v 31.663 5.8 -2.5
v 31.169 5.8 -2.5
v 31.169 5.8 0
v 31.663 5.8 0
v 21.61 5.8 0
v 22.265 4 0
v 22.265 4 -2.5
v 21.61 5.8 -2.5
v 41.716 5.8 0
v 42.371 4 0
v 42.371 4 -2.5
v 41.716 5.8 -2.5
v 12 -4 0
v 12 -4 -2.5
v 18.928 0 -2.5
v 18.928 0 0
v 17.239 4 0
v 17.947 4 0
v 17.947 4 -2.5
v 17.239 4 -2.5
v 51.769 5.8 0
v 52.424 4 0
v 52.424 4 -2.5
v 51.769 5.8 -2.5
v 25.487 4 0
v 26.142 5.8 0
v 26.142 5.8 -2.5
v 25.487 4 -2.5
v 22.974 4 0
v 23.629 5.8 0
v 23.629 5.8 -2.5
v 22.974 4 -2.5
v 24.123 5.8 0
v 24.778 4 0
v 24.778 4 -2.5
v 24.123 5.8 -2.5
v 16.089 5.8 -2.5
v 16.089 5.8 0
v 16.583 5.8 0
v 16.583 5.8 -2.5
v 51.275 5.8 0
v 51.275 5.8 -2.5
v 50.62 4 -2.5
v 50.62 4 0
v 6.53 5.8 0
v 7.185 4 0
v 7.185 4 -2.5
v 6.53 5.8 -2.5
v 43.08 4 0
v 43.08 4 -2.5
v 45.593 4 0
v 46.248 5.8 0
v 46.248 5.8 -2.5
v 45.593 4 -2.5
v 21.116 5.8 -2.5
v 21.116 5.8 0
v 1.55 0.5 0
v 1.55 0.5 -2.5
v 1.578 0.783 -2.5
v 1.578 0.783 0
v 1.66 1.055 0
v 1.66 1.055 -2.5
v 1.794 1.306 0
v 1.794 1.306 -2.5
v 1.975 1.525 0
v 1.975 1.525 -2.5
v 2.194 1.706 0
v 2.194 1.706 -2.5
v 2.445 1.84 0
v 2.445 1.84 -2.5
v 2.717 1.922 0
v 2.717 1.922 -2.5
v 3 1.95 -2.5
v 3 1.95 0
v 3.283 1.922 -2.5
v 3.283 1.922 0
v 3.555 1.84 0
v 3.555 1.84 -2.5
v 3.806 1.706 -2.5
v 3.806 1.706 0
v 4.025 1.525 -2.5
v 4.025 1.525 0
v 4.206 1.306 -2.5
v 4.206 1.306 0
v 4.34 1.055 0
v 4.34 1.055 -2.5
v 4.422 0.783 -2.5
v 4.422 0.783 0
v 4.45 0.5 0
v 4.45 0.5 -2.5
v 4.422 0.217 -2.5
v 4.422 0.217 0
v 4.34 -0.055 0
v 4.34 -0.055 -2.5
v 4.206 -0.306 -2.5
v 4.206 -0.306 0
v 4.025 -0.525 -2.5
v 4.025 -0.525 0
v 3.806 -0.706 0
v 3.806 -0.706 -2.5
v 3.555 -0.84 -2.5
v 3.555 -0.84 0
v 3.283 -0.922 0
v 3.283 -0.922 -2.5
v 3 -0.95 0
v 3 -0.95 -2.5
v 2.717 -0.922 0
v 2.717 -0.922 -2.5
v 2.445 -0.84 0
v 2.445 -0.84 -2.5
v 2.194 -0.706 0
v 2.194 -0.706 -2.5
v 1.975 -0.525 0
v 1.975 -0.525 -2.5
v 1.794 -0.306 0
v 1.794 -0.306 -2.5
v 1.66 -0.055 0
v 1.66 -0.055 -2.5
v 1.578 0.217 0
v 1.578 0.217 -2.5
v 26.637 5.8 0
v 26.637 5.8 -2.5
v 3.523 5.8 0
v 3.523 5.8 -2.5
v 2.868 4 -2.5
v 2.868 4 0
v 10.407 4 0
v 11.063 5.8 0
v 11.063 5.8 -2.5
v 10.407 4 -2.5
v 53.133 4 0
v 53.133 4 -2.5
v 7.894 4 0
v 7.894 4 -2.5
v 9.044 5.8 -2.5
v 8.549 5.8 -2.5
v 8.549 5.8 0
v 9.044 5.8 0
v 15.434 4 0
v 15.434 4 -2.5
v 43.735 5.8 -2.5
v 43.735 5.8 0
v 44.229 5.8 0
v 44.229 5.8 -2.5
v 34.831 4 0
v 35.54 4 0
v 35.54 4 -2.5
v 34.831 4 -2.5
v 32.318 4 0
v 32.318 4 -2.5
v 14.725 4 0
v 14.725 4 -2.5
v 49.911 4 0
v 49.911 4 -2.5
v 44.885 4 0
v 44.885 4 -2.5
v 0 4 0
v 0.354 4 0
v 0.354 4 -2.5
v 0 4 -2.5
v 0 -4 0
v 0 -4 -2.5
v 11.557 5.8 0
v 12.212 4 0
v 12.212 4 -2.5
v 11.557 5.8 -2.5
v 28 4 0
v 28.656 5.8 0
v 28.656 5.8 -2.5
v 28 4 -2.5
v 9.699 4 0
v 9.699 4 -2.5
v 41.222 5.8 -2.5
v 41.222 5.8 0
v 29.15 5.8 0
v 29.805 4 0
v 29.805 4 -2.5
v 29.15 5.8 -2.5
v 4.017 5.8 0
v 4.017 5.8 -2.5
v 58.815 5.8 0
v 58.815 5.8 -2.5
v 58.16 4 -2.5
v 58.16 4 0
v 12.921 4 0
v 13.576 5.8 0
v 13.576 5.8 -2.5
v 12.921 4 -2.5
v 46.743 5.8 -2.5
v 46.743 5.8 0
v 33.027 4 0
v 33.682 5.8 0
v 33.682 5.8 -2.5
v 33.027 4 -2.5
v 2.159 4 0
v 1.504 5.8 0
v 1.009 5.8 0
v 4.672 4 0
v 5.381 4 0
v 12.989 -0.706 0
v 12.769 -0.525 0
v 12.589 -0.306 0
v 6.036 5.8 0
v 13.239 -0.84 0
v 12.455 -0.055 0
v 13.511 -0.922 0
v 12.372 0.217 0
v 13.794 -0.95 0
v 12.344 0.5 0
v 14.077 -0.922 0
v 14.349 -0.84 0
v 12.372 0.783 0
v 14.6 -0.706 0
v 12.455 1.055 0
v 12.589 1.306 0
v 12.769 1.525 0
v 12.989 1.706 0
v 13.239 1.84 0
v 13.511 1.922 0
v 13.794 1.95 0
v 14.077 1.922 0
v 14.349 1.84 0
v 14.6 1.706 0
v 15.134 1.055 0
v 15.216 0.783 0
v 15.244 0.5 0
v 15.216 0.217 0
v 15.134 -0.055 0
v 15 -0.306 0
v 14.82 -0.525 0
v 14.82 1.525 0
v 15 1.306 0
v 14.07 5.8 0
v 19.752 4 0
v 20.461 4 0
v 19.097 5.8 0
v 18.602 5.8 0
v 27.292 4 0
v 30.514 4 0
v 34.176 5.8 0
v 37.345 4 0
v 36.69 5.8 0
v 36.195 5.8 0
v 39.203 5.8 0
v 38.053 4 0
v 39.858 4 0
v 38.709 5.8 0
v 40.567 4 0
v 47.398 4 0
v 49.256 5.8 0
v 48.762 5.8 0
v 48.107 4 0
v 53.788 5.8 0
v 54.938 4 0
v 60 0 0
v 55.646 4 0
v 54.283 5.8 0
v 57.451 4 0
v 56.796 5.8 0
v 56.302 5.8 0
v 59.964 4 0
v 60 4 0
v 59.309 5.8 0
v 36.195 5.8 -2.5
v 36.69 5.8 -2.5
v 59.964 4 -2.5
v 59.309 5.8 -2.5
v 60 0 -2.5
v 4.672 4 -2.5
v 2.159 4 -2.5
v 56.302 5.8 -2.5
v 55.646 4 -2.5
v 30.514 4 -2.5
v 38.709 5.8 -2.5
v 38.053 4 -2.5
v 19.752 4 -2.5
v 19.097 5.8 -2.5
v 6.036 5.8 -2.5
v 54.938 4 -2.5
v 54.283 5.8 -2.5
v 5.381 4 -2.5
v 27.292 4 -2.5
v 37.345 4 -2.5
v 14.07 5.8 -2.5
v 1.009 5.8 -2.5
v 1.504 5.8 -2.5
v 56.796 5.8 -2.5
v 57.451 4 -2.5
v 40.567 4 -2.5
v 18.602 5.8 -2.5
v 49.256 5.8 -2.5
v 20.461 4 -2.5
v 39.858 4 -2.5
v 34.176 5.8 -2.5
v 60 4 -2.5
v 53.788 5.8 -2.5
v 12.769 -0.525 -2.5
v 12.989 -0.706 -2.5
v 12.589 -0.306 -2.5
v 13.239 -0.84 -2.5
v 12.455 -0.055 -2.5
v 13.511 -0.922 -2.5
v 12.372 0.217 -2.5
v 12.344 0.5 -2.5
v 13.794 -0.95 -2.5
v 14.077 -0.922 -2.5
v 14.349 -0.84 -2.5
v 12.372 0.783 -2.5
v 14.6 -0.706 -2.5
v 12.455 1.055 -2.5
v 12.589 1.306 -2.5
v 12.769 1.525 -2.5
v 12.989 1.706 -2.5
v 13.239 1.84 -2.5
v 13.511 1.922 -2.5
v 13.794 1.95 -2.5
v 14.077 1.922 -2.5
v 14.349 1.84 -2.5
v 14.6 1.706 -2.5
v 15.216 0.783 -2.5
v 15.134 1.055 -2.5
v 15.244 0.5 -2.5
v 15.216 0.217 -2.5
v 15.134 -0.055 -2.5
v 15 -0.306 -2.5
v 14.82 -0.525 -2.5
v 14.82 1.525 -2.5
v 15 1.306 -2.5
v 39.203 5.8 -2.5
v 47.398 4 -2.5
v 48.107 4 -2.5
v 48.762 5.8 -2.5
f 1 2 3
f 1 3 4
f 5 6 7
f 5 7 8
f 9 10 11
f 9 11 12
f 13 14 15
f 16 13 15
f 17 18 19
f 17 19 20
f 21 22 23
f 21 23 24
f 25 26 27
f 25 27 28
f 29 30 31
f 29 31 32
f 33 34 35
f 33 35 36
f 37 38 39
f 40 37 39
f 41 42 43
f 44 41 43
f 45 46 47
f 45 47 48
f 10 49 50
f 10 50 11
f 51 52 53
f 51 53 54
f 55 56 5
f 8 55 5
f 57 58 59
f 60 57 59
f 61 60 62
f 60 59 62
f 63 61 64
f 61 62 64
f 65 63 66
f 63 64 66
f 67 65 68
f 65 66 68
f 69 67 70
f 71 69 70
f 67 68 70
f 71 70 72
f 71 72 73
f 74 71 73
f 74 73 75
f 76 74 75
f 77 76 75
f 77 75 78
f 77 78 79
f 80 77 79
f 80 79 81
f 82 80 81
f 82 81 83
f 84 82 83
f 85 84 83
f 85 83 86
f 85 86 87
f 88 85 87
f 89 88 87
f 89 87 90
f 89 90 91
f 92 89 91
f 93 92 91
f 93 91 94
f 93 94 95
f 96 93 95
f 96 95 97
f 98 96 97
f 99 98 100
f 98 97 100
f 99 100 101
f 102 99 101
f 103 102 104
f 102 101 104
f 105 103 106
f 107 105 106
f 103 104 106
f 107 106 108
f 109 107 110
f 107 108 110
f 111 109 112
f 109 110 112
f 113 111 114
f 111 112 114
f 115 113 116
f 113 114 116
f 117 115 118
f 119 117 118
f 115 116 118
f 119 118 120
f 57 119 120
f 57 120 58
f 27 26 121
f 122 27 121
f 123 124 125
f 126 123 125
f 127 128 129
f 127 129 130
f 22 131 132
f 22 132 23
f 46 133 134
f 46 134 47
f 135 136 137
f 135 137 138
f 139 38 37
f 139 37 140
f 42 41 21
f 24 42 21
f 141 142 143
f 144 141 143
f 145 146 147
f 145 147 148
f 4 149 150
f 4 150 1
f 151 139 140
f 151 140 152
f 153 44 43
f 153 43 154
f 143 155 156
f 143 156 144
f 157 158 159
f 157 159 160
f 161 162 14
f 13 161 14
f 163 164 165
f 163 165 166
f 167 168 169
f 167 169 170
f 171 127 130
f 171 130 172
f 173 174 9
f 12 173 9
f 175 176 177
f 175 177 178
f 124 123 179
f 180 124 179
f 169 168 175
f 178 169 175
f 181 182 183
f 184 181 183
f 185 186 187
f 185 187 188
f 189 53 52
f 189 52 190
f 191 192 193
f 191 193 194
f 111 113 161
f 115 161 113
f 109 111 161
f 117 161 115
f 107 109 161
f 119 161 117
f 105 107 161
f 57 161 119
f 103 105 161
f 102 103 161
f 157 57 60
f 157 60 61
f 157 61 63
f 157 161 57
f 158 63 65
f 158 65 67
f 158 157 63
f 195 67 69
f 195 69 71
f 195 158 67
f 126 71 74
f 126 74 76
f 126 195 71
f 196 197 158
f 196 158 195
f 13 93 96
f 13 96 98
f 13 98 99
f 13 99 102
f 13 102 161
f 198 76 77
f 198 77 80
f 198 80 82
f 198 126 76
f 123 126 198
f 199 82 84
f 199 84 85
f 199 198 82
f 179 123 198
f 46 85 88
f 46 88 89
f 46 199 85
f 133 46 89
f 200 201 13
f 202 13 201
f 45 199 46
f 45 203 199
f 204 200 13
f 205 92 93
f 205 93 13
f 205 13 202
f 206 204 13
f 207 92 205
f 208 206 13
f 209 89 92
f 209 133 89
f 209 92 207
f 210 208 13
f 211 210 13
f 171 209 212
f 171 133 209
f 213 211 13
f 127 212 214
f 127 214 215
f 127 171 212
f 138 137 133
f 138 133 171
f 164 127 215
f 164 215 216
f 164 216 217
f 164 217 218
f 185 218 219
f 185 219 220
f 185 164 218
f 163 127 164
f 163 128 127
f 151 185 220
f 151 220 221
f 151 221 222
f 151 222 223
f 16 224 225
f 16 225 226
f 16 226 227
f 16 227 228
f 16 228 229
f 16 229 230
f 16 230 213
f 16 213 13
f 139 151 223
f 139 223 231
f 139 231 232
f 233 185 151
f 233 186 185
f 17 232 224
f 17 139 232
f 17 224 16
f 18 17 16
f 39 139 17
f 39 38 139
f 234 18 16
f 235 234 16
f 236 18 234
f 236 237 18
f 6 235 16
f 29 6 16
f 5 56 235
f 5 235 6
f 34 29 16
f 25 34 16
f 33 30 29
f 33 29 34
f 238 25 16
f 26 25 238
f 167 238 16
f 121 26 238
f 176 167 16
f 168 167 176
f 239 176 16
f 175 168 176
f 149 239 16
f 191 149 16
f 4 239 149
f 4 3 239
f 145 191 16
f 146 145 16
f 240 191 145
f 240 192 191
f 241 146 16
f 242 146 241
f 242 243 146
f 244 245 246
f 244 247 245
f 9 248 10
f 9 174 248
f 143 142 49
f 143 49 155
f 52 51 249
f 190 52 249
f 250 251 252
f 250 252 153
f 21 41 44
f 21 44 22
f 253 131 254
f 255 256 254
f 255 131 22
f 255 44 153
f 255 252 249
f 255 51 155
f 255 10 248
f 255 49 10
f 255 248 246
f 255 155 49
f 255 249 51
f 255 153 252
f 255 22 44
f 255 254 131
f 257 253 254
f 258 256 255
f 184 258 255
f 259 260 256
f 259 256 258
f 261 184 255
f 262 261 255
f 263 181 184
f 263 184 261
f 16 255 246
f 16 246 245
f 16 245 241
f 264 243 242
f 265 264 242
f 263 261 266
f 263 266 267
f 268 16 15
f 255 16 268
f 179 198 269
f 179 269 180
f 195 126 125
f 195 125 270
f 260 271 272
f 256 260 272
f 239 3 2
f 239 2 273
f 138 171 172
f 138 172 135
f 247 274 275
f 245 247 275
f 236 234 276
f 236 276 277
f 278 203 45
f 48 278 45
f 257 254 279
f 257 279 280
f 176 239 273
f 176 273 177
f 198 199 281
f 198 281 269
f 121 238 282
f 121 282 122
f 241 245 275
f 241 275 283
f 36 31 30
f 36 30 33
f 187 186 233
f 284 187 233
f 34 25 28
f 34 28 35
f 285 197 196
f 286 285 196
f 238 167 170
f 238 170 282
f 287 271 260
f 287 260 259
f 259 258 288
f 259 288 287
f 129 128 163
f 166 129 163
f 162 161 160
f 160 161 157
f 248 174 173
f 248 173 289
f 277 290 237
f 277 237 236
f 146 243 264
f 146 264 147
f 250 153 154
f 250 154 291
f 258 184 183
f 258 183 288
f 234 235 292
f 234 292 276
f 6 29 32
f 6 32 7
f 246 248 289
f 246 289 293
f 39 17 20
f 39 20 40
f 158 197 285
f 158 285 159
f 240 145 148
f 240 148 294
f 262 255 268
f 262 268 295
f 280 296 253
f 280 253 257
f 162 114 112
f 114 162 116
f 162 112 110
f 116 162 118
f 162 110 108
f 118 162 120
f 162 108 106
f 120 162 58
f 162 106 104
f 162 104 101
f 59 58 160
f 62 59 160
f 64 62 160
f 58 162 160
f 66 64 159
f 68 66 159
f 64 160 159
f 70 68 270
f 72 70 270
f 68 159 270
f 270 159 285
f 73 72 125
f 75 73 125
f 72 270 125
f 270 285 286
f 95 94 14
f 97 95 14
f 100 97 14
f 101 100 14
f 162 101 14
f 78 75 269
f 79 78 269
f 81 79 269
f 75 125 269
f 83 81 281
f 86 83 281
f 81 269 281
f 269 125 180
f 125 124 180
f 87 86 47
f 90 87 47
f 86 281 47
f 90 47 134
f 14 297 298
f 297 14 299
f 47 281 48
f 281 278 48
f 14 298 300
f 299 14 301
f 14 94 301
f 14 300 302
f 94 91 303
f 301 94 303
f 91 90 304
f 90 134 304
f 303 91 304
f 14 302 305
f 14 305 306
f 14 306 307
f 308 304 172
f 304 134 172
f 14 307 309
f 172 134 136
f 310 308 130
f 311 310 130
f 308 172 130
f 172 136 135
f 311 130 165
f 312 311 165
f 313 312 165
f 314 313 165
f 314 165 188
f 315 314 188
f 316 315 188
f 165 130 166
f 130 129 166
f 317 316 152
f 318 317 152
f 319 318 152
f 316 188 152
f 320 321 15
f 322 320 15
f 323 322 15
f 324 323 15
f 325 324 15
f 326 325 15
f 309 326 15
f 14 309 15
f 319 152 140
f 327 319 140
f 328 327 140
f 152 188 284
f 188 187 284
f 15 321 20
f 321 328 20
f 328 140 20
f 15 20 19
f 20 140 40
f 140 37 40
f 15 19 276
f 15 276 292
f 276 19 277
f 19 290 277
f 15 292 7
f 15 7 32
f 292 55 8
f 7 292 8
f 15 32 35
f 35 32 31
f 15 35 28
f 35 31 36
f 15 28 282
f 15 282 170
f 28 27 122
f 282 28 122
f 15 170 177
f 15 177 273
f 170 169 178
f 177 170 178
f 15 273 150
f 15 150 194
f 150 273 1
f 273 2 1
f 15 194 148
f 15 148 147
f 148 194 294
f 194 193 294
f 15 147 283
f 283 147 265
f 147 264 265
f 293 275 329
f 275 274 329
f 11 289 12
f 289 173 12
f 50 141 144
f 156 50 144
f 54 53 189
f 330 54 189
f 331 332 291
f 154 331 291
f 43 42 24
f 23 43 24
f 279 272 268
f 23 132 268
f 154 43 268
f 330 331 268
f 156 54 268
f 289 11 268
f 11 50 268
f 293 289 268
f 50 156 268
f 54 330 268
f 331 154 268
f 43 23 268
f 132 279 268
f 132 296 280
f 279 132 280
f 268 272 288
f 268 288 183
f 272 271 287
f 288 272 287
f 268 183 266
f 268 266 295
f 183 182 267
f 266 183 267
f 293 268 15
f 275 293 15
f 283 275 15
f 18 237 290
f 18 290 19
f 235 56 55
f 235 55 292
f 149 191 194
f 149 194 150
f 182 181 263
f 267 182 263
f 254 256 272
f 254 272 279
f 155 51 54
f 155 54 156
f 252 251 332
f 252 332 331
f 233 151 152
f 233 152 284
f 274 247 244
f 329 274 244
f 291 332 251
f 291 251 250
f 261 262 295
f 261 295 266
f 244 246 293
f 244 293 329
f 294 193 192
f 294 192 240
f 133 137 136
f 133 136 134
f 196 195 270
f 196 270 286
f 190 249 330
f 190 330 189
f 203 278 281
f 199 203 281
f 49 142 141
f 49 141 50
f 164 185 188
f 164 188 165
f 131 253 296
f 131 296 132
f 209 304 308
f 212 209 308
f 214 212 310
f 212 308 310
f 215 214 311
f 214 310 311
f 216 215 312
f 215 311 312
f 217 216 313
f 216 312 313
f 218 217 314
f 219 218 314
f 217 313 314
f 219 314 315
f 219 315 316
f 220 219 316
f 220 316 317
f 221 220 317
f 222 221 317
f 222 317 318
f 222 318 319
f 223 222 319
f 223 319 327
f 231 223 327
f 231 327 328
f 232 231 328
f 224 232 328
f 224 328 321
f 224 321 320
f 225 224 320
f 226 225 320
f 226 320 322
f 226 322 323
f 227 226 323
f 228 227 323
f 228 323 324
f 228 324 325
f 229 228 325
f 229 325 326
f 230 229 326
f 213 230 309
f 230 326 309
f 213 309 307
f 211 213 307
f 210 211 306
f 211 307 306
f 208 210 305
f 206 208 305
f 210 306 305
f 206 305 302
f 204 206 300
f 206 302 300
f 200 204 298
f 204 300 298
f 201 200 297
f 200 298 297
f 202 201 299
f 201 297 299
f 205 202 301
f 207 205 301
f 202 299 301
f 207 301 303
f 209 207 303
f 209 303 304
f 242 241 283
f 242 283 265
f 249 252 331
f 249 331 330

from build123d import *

# Parameters (mm, degrees)
BLANKSKE_W               = 60
BLANKSKE_H               = 5.8
BLANK_DEPTH              = 2.5
TOOTHCUTSIM_DEPTH        = 61.331500893
TEETHCUTS_COUNT          = 25
TEETHCUTS_PITCH          = 2.51327412
EXTRUDE_1_DEPTH          = 2.5
SKETCH_3_R               = 1.45
CUT_EXTRUDE_1_DEPTH      = 23
CUT_EXTRUDE_1_DEPTH_BACK = 12


with BuildPart() as part:
    # BlankSke → Blank (new body)
    with BuildSketch(Plane.XY):
        with Locations((30, 2.9)):
            Rectangle(BLANKSKE_W, BLANKSKE_H)
    extrude(amount=-BLANK_DEPTH)

    # TooCutSkeSim → ToothCutSim (cut, through all)
    with BuildSketch(Plane.XY):
        Polygon((0.354348296, 4), (-0.354348296, 4), (-1.018739561, 5.8254), (1.018739561, 5.8254), align=None)
    toothcutsim = extrude(amount=-TOOTHCUTSIM_DEPTH, mode=Mode.SUBTRACT)

    # TeethCuts: ToothCutSim ×25
    with Locations(*[(i * TEETHCUTS_PITCH, 0, 0) for i in range(1, TEETHCUTS_COUNT)]):
        add(toothcutsim, mode=Mode.SUBTRACT)

    # 草图2 → 凸台-拉伸1 (add)
    with BuildSketch(Plane(origin=(0, 0, -2.5), x_dir=(-1, 0, 0), z_dir=(0, 0, -1))):
        Polygon((0, 4), (0, -4), (-12, -4), (-18.92820323, 0), align=None)
    extrude(amount=-EXTRUDE_1_DEPTH)

    # 草图3 → 切除-拉伸1 (cut, two sides)
    with BuildSketch(Plane(origin=(0, 0, -2.5), x_dir=(-1, 0, 0), z_dir=(0, 0, -1))) as cut_extrude_1_sk:
        with Locations((-3, 0.5)):
            Circle(SKETCH_3_R)
        with Locations((-13.794228634, 0.5)):
            Circle(SKETCH_3_R)
    extrude(amount=CUT_EXTRUDE_1_DEPTH, mode=Mode.SUBTRACT)
    extrude(cut_extrude_1_sk.sketch, amount=-CUT_EXTRUDE_1_DEPTH_BACK, mode=Mode.SUBTRACT)


solid = part.part
